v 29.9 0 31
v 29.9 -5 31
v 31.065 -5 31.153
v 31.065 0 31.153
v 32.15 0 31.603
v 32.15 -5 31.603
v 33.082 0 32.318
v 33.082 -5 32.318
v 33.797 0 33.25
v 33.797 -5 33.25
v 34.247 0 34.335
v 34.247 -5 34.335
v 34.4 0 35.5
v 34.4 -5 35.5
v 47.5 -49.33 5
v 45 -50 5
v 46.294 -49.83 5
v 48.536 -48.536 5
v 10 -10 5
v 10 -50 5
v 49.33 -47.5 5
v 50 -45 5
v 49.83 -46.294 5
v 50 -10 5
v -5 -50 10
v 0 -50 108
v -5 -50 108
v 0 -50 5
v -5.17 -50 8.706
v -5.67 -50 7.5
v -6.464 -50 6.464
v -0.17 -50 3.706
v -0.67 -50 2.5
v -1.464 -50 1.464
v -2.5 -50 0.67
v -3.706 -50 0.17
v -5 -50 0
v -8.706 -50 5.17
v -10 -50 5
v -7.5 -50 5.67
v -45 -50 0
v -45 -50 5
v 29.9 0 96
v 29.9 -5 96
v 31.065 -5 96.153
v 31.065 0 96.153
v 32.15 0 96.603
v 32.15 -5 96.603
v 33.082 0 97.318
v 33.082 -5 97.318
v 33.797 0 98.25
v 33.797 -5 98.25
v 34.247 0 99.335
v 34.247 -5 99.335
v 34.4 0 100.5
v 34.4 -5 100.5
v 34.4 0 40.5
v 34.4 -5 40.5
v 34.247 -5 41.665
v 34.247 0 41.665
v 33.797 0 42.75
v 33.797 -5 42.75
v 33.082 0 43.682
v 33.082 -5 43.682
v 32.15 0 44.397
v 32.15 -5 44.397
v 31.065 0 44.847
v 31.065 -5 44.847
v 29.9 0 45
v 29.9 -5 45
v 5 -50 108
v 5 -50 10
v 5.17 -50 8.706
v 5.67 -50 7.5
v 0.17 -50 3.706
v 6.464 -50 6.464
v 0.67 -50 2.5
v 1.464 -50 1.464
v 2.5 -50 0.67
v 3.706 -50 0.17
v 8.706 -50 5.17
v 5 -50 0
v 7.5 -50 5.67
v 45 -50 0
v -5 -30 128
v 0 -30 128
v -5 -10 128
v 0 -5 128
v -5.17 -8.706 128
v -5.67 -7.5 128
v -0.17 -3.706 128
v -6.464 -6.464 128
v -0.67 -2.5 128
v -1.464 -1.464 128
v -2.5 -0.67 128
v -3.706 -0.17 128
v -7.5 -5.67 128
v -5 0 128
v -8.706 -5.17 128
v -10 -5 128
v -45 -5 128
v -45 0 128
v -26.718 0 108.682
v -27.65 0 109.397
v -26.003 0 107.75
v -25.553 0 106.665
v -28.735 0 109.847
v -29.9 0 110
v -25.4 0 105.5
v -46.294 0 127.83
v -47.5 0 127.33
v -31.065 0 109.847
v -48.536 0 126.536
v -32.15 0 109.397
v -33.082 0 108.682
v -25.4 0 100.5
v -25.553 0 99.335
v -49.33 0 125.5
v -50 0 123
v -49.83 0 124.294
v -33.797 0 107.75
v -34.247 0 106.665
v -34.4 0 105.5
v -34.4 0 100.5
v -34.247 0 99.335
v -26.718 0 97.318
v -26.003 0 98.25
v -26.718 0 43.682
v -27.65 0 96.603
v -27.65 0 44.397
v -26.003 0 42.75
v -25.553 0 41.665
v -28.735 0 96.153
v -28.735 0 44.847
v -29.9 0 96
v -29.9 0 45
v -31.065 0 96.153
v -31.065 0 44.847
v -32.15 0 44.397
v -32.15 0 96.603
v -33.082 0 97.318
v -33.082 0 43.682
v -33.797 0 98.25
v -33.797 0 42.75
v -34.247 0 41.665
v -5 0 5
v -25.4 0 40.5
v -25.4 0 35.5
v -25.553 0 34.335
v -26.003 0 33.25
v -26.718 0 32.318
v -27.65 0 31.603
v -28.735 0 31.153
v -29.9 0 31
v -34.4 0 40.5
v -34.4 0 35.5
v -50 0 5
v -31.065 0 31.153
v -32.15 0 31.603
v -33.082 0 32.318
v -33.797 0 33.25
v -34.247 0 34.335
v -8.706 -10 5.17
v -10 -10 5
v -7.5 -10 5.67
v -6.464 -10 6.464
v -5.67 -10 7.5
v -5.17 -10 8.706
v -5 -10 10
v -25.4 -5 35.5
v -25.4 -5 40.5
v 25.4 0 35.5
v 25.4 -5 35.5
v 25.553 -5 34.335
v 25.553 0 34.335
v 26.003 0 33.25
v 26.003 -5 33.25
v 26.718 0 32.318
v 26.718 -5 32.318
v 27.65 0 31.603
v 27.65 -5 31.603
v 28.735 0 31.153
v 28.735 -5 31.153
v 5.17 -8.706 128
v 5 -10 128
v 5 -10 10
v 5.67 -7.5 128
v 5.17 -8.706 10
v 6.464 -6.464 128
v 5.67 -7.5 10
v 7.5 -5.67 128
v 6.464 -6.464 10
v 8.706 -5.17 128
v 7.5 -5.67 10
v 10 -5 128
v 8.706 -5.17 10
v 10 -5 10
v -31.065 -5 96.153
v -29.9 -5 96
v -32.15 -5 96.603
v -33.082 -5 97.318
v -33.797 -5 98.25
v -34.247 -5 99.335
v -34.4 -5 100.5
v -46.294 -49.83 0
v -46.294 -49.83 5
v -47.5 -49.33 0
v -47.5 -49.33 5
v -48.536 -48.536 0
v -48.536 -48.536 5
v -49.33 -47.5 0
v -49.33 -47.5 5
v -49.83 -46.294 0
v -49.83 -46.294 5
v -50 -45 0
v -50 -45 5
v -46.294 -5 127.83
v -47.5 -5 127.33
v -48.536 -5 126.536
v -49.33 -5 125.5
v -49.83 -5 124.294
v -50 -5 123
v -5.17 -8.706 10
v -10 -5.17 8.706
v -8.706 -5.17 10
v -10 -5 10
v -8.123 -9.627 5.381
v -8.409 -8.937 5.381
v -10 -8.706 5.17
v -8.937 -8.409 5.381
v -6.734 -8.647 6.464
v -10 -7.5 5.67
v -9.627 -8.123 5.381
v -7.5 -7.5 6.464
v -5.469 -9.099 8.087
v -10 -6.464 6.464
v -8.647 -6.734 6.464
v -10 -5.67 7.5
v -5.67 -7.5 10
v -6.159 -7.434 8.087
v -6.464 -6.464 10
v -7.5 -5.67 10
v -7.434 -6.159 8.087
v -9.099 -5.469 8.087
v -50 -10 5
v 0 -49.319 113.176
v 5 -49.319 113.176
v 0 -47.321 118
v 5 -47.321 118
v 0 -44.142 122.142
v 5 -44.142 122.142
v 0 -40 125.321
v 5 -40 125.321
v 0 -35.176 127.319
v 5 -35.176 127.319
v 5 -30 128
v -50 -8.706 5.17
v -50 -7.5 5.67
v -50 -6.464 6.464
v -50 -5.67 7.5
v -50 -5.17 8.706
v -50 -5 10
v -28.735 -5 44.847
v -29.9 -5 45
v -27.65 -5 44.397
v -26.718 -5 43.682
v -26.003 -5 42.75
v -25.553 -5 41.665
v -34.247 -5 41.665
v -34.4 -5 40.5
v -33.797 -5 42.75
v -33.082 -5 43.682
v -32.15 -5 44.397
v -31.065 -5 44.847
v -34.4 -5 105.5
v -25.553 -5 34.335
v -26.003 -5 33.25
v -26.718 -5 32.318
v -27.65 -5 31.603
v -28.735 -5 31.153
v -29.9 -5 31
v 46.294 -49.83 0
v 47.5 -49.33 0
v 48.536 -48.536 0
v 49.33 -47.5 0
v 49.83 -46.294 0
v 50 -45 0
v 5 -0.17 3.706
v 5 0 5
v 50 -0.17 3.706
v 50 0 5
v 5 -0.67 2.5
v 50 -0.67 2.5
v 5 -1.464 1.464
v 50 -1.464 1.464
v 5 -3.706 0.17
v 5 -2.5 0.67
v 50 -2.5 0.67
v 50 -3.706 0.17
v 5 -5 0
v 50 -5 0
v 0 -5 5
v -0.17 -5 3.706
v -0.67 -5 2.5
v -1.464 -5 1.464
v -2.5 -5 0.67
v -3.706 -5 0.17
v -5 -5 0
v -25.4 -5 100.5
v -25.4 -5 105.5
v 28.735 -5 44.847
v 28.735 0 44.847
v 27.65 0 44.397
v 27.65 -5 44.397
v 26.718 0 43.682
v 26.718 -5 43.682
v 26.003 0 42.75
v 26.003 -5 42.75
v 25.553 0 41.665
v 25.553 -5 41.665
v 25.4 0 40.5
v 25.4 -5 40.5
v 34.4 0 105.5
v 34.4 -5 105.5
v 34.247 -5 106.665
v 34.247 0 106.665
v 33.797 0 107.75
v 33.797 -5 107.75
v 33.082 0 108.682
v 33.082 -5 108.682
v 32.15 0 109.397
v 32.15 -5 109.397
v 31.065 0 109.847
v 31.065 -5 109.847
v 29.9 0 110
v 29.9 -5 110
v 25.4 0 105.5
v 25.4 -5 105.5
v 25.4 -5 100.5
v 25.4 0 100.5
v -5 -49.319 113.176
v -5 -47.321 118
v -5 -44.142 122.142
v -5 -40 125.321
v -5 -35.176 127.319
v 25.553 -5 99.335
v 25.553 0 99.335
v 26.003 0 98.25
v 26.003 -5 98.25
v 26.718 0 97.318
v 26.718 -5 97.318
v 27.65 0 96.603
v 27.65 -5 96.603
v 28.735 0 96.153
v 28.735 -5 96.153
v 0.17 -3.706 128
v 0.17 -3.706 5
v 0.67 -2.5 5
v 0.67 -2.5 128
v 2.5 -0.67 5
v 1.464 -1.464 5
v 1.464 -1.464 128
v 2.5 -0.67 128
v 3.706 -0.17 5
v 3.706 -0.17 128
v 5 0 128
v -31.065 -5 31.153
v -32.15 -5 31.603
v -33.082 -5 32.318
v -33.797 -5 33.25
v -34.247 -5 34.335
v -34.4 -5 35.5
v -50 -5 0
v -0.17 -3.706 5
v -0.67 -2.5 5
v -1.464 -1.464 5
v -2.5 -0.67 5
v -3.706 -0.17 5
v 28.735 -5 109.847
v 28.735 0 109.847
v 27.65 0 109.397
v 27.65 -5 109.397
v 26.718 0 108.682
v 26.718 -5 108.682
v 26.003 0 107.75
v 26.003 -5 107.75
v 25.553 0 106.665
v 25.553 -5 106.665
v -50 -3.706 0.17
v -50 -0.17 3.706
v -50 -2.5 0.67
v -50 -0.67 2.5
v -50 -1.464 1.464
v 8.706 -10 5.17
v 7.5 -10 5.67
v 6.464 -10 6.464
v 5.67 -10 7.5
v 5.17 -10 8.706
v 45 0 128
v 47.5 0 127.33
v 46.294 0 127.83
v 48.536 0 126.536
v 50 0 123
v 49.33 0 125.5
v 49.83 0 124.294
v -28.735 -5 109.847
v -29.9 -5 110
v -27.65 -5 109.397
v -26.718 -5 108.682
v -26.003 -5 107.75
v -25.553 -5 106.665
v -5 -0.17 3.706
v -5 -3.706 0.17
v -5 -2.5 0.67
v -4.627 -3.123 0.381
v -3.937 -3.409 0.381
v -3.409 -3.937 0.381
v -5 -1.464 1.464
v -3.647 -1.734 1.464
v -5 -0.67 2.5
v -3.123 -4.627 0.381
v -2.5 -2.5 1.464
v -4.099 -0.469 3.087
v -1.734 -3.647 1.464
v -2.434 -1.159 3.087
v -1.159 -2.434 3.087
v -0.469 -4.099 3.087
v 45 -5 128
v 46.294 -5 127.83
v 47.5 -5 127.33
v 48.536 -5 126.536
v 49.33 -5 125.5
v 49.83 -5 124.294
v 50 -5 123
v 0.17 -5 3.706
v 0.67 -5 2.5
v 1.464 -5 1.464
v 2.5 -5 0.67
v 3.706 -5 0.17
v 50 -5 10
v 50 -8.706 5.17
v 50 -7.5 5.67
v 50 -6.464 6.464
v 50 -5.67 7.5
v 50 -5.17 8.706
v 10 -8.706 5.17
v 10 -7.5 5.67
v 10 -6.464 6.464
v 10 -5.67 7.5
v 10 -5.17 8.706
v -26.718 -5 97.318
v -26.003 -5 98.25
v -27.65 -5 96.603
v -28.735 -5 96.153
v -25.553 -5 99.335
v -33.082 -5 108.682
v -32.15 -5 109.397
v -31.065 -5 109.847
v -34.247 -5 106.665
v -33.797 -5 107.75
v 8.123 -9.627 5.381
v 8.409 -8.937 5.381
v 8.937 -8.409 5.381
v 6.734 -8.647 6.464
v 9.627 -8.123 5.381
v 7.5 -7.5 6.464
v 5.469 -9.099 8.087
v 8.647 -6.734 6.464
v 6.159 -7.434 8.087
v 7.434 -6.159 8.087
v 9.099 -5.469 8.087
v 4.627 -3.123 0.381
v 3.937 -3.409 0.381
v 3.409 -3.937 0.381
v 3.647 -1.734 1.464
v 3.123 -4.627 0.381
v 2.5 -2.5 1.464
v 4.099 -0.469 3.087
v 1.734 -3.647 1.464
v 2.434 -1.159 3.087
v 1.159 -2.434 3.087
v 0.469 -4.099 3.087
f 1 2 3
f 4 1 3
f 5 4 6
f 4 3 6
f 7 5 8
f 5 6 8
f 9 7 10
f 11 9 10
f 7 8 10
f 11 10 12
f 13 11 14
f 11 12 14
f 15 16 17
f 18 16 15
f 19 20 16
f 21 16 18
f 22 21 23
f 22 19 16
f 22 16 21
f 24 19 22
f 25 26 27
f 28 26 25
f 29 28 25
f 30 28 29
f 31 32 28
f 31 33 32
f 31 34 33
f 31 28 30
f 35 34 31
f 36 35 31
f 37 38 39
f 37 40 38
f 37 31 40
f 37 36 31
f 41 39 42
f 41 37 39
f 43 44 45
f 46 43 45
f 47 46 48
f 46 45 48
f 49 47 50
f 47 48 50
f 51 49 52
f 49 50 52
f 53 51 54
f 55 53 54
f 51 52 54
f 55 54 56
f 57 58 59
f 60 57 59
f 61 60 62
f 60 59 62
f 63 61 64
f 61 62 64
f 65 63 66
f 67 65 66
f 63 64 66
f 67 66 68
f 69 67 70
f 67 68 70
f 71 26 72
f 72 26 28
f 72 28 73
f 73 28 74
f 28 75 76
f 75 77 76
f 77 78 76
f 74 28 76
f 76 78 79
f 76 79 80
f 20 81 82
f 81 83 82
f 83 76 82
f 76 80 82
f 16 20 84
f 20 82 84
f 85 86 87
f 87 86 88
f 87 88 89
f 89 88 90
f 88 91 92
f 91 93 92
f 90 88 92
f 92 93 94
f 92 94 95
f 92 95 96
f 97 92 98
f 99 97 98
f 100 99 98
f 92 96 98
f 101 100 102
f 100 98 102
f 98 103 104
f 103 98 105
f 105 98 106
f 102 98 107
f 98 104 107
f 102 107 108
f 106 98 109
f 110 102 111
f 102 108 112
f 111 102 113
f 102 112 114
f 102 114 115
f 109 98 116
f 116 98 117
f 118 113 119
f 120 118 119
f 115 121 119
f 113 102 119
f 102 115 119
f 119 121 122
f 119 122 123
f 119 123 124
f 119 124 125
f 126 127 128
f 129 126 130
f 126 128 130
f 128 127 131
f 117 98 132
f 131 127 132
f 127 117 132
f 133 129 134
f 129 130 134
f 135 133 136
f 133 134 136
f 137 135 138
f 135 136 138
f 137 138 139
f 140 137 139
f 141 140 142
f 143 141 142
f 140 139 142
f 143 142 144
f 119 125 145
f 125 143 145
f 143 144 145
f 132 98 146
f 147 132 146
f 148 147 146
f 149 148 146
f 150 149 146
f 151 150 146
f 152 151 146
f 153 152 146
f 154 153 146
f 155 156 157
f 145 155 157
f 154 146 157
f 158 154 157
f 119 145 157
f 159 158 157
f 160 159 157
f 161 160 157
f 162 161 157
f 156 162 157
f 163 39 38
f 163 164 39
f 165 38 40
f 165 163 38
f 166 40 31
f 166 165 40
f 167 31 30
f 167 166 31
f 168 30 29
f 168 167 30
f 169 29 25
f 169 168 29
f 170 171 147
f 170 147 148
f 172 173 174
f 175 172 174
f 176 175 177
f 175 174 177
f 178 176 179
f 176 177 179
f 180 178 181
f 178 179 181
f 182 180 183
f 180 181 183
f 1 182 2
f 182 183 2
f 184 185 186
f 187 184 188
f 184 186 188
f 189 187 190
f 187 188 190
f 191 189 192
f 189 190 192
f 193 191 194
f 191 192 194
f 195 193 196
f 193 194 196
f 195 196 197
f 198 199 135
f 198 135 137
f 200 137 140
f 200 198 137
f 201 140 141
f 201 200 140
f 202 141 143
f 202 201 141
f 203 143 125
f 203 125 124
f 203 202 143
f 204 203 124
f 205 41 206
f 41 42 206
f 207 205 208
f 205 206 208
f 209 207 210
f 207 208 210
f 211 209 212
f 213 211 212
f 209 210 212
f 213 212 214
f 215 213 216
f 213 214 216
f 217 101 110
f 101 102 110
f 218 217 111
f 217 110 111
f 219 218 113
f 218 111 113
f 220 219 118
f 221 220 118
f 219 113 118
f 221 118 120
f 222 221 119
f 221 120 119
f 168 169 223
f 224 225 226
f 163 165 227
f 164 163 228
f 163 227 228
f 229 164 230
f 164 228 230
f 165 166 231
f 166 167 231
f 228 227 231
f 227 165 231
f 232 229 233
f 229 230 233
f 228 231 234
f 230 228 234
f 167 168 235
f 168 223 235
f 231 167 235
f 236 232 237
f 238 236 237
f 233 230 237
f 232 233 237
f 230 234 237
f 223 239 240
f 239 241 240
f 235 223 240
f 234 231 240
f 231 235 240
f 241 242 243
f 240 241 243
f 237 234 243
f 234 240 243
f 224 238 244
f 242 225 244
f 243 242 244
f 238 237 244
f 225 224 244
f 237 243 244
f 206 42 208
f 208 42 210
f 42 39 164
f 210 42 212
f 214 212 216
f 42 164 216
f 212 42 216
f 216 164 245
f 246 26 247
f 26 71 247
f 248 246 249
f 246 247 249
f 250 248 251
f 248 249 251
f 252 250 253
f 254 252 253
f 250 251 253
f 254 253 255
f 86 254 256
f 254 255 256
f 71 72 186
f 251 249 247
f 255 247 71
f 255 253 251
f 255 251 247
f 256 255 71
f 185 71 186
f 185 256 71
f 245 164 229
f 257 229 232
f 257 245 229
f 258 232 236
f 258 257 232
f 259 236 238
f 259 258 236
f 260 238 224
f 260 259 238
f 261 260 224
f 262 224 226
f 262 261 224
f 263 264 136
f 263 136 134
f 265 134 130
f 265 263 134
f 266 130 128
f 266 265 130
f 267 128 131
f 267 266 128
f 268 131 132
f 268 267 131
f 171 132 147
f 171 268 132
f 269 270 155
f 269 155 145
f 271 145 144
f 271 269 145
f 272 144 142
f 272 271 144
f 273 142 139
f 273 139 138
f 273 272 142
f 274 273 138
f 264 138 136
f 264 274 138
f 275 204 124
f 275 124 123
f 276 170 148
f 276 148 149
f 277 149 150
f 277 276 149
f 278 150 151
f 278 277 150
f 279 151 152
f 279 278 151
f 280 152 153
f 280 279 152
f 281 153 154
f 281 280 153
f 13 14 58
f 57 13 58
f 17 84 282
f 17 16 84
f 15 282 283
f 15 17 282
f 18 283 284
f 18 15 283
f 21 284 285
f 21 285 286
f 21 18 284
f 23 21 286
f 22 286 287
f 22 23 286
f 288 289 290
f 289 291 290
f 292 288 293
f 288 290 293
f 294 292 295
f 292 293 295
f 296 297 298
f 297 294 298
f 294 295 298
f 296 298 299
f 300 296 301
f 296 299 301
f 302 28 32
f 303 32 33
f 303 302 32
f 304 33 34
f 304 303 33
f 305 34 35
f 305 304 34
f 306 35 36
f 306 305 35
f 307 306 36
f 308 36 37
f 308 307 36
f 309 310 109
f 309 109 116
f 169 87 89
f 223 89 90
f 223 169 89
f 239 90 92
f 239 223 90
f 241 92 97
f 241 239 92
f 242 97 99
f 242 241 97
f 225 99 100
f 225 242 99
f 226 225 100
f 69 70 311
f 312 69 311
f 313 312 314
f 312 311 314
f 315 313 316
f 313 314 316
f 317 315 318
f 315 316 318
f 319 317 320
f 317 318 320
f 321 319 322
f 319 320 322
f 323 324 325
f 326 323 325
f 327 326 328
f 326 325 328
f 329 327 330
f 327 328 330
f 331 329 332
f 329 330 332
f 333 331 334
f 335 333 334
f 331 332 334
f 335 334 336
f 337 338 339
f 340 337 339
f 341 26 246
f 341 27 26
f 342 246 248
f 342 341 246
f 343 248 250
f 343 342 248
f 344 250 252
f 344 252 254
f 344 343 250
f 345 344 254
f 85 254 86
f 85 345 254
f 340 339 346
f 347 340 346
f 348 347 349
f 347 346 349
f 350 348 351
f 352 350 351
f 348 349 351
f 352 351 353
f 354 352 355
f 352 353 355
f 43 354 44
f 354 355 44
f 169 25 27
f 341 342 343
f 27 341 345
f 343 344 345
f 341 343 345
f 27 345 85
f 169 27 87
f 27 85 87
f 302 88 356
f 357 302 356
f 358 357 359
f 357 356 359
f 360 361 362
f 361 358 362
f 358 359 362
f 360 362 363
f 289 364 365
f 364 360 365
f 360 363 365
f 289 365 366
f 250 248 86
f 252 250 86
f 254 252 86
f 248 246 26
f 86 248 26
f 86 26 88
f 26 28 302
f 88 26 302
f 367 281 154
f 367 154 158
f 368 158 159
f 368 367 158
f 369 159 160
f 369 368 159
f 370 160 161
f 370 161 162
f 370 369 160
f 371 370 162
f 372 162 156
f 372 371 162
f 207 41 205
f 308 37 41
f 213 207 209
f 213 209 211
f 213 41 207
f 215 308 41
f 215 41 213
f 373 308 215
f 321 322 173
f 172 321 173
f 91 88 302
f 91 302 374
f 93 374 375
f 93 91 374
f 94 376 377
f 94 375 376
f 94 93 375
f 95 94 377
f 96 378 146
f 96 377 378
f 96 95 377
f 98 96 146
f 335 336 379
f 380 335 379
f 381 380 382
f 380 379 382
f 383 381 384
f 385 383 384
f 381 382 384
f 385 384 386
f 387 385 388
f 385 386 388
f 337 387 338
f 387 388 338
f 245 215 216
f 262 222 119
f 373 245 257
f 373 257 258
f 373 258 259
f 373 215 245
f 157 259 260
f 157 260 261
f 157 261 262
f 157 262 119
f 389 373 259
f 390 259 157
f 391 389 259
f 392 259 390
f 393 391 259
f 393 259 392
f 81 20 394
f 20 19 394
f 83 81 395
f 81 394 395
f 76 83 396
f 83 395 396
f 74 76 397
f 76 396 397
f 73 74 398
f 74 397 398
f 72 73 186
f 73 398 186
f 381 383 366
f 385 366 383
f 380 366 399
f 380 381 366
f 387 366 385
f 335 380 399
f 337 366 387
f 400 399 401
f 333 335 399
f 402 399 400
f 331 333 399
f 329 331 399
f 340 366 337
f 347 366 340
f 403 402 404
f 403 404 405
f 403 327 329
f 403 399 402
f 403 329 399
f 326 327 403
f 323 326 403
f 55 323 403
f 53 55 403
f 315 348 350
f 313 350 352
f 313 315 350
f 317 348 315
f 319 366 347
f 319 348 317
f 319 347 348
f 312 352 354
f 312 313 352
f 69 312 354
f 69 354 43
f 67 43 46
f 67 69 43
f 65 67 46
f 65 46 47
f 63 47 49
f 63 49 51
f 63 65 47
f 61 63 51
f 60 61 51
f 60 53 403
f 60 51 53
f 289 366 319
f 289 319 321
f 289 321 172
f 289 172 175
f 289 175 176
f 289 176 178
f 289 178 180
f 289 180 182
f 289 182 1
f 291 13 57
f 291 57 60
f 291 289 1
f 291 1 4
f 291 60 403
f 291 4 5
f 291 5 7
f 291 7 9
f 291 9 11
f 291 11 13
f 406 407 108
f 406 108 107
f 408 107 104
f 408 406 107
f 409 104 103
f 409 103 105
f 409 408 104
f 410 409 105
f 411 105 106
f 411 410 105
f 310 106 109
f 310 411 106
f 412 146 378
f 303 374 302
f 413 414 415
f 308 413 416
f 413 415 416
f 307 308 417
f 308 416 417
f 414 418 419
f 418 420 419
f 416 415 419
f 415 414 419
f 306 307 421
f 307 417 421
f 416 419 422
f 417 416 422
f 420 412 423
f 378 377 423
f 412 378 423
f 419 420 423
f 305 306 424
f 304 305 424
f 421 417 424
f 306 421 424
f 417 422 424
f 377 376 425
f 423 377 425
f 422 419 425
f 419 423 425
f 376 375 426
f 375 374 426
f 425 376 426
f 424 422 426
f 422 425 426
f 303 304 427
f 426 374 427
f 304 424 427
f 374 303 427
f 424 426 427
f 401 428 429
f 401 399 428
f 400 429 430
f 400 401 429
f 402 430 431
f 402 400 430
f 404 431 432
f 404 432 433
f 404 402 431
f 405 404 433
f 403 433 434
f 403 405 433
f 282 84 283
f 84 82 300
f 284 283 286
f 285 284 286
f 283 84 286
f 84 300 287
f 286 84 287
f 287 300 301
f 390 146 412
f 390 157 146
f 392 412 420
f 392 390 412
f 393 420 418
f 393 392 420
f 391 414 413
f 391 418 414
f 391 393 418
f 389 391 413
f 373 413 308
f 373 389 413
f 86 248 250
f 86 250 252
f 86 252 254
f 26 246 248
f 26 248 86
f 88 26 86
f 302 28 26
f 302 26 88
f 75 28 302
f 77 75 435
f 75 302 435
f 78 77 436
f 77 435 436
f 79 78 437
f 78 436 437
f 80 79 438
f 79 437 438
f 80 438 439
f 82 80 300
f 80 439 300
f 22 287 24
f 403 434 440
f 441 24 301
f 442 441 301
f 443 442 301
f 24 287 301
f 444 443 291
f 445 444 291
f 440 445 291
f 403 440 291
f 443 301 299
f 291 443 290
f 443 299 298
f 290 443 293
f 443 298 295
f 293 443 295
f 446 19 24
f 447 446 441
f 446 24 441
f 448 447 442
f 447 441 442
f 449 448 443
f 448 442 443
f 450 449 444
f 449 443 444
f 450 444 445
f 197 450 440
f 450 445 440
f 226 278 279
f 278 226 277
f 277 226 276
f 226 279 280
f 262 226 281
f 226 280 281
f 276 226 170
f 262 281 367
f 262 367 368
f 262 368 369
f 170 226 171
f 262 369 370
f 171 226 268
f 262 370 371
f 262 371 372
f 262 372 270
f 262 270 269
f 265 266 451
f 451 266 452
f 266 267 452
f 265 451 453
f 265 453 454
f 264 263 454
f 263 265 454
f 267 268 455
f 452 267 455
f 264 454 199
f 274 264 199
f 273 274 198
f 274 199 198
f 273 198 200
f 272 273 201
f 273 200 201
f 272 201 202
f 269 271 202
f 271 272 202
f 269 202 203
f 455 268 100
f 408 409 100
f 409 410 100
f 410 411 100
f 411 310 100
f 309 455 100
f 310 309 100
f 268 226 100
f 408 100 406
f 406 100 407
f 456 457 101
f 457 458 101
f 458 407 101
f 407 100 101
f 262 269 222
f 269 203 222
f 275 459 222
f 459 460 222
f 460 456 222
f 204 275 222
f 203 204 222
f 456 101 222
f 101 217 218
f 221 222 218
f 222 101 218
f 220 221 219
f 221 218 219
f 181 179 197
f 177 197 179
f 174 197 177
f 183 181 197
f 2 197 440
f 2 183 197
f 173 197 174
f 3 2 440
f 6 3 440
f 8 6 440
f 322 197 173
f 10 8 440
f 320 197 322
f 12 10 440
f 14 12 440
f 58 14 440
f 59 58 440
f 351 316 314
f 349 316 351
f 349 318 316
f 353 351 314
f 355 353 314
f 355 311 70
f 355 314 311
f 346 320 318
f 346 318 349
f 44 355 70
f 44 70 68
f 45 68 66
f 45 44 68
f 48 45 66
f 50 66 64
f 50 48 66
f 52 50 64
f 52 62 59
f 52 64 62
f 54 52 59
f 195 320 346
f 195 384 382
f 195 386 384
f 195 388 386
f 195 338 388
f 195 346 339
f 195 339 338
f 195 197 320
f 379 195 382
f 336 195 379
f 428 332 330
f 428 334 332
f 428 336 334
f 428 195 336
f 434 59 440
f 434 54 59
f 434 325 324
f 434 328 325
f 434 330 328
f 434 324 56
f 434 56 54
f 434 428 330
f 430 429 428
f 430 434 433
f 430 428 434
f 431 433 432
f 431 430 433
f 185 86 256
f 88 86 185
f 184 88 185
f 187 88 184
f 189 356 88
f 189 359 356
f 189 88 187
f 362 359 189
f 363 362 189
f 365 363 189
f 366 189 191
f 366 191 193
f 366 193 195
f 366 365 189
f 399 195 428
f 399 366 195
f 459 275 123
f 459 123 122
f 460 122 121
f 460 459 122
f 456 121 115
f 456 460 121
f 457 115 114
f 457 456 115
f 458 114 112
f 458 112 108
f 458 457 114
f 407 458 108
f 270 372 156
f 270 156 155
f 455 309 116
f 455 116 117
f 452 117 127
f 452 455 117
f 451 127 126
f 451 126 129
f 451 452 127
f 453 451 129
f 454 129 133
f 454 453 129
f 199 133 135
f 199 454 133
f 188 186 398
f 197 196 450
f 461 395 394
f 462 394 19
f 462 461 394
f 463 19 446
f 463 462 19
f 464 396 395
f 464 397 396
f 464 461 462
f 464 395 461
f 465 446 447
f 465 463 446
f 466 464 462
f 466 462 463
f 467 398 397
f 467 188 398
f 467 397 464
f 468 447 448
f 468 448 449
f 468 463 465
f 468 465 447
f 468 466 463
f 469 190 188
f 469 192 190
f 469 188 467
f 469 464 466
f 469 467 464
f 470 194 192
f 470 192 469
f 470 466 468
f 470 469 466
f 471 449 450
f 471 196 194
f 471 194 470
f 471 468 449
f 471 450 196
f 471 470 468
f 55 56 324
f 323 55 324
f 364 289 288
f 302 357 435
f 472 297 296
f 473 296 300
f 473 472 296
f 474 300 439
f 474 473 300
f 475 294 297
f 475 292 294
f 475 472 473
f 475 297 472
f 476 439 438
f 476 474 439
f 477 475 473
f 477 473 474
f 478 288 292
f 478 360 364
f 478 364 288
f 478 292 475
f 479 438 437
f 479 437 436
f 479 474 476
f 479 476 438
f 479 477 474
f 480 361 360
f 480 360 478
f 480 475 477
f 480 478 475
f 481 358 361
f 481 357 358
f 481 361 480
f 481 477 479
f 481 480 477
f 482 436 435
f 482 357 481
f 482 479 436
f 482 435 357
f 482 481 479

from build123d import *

# Parameters (mm, degrees)
F0_W     = 50
F0_H     = 50
F1_DEPTH = 128
F2_W     = 45
F2_H     = 45
F3_DEPTH = 123
F4_R     = 5
F5_R     = 20
F7_DEPTH = 5.001


with BuildPart() as f1:
    # F0 (on Top) → F1 (new body)
    with BuildSketch(Plane.XY):
        with Locations((25, -25)):
            Rectangle(F0_W, F0_H)
    extrude(amount=F1_DEPTH)

    # F2 (on face) → F3 (cut)
    with BuildSketch(Plane.XY.offset(128)):
        with Locations((27.5, -27.5)):
            Rectangle(F2_W, F2_H)
    extrude(amount=-F3_DEPTH, mode=Mode.SUBTRACT)

    # F4
    f4_edges = [f1.edges().sort_by_distance(p)[0] for p in [
        (5, -5, 66.5),
        (0, 0, 64),
        (25, 0, 0),
        (0, -25, 0),
        (5, -27.5, 5),
        (27.5, -5, 5),
        (50, -2.5, 128),
        (50, -50, 2.5),
    ]]
    fillet(f4_edges, radius=F4_R)

    # F5
    f5_edges = [f1.edges().sort_by_distance(p)[0] for p in [
        (2.5, -50, 128),
    ]]
    fillet(f5_edges, radius=F5_R)

    # F6 (on face) → F7 (cut, through all)
    with BuildSketch(Plane.XZ.offset(5)):
        with BuildLine():
            ThreePointArc((29.9, 110), (26.718019, 108.681981), (25.4, 105.5))
            Line((25.4, 105.5), (25.4, 100.5))
            ThreePointArc((25.4, 100.5), (26.718019, 97.318019), (29.9, 96))
            ThreePointArc((29.9, 96), (33.081981, 97.318019), (34.4, 100.5))
            Line((34.4, 100.5), (34.4, 105.5))
            ThreePointArc((34.4, 105.5), (33.081981, 108.681981), (29.9, 110))
        make_face()
        with BuildLine():
            ThreePointArc((34.4, 40.5), (33.081981, 43.681981), (29.9, 45))
            ThreePointArc((29.9, 45), (26.718019, 43.681981), (25.4, 40.5))
            Line((25.4, 40.5), (25.4, 35.5))
            ThreePointArc((25.4, 35.5), (26.718019, 32.318019), (29.9, 31))
            ThreePointArc((29.9, 31), (33.081981, 32.318019), (34.4, 35.5))
            Line((34.4, 35.5), (34.4, 40.5))
        make_face()
    extrude(amount=-F7_DEPTH, mode=Mode.SUBTRACT)


with BuildPart() as f8_1:
    # F8: instance of F1
    add(f1.part.mirror(Plane.YZ))


solid = Compound([f1.part, f8_1.part])
